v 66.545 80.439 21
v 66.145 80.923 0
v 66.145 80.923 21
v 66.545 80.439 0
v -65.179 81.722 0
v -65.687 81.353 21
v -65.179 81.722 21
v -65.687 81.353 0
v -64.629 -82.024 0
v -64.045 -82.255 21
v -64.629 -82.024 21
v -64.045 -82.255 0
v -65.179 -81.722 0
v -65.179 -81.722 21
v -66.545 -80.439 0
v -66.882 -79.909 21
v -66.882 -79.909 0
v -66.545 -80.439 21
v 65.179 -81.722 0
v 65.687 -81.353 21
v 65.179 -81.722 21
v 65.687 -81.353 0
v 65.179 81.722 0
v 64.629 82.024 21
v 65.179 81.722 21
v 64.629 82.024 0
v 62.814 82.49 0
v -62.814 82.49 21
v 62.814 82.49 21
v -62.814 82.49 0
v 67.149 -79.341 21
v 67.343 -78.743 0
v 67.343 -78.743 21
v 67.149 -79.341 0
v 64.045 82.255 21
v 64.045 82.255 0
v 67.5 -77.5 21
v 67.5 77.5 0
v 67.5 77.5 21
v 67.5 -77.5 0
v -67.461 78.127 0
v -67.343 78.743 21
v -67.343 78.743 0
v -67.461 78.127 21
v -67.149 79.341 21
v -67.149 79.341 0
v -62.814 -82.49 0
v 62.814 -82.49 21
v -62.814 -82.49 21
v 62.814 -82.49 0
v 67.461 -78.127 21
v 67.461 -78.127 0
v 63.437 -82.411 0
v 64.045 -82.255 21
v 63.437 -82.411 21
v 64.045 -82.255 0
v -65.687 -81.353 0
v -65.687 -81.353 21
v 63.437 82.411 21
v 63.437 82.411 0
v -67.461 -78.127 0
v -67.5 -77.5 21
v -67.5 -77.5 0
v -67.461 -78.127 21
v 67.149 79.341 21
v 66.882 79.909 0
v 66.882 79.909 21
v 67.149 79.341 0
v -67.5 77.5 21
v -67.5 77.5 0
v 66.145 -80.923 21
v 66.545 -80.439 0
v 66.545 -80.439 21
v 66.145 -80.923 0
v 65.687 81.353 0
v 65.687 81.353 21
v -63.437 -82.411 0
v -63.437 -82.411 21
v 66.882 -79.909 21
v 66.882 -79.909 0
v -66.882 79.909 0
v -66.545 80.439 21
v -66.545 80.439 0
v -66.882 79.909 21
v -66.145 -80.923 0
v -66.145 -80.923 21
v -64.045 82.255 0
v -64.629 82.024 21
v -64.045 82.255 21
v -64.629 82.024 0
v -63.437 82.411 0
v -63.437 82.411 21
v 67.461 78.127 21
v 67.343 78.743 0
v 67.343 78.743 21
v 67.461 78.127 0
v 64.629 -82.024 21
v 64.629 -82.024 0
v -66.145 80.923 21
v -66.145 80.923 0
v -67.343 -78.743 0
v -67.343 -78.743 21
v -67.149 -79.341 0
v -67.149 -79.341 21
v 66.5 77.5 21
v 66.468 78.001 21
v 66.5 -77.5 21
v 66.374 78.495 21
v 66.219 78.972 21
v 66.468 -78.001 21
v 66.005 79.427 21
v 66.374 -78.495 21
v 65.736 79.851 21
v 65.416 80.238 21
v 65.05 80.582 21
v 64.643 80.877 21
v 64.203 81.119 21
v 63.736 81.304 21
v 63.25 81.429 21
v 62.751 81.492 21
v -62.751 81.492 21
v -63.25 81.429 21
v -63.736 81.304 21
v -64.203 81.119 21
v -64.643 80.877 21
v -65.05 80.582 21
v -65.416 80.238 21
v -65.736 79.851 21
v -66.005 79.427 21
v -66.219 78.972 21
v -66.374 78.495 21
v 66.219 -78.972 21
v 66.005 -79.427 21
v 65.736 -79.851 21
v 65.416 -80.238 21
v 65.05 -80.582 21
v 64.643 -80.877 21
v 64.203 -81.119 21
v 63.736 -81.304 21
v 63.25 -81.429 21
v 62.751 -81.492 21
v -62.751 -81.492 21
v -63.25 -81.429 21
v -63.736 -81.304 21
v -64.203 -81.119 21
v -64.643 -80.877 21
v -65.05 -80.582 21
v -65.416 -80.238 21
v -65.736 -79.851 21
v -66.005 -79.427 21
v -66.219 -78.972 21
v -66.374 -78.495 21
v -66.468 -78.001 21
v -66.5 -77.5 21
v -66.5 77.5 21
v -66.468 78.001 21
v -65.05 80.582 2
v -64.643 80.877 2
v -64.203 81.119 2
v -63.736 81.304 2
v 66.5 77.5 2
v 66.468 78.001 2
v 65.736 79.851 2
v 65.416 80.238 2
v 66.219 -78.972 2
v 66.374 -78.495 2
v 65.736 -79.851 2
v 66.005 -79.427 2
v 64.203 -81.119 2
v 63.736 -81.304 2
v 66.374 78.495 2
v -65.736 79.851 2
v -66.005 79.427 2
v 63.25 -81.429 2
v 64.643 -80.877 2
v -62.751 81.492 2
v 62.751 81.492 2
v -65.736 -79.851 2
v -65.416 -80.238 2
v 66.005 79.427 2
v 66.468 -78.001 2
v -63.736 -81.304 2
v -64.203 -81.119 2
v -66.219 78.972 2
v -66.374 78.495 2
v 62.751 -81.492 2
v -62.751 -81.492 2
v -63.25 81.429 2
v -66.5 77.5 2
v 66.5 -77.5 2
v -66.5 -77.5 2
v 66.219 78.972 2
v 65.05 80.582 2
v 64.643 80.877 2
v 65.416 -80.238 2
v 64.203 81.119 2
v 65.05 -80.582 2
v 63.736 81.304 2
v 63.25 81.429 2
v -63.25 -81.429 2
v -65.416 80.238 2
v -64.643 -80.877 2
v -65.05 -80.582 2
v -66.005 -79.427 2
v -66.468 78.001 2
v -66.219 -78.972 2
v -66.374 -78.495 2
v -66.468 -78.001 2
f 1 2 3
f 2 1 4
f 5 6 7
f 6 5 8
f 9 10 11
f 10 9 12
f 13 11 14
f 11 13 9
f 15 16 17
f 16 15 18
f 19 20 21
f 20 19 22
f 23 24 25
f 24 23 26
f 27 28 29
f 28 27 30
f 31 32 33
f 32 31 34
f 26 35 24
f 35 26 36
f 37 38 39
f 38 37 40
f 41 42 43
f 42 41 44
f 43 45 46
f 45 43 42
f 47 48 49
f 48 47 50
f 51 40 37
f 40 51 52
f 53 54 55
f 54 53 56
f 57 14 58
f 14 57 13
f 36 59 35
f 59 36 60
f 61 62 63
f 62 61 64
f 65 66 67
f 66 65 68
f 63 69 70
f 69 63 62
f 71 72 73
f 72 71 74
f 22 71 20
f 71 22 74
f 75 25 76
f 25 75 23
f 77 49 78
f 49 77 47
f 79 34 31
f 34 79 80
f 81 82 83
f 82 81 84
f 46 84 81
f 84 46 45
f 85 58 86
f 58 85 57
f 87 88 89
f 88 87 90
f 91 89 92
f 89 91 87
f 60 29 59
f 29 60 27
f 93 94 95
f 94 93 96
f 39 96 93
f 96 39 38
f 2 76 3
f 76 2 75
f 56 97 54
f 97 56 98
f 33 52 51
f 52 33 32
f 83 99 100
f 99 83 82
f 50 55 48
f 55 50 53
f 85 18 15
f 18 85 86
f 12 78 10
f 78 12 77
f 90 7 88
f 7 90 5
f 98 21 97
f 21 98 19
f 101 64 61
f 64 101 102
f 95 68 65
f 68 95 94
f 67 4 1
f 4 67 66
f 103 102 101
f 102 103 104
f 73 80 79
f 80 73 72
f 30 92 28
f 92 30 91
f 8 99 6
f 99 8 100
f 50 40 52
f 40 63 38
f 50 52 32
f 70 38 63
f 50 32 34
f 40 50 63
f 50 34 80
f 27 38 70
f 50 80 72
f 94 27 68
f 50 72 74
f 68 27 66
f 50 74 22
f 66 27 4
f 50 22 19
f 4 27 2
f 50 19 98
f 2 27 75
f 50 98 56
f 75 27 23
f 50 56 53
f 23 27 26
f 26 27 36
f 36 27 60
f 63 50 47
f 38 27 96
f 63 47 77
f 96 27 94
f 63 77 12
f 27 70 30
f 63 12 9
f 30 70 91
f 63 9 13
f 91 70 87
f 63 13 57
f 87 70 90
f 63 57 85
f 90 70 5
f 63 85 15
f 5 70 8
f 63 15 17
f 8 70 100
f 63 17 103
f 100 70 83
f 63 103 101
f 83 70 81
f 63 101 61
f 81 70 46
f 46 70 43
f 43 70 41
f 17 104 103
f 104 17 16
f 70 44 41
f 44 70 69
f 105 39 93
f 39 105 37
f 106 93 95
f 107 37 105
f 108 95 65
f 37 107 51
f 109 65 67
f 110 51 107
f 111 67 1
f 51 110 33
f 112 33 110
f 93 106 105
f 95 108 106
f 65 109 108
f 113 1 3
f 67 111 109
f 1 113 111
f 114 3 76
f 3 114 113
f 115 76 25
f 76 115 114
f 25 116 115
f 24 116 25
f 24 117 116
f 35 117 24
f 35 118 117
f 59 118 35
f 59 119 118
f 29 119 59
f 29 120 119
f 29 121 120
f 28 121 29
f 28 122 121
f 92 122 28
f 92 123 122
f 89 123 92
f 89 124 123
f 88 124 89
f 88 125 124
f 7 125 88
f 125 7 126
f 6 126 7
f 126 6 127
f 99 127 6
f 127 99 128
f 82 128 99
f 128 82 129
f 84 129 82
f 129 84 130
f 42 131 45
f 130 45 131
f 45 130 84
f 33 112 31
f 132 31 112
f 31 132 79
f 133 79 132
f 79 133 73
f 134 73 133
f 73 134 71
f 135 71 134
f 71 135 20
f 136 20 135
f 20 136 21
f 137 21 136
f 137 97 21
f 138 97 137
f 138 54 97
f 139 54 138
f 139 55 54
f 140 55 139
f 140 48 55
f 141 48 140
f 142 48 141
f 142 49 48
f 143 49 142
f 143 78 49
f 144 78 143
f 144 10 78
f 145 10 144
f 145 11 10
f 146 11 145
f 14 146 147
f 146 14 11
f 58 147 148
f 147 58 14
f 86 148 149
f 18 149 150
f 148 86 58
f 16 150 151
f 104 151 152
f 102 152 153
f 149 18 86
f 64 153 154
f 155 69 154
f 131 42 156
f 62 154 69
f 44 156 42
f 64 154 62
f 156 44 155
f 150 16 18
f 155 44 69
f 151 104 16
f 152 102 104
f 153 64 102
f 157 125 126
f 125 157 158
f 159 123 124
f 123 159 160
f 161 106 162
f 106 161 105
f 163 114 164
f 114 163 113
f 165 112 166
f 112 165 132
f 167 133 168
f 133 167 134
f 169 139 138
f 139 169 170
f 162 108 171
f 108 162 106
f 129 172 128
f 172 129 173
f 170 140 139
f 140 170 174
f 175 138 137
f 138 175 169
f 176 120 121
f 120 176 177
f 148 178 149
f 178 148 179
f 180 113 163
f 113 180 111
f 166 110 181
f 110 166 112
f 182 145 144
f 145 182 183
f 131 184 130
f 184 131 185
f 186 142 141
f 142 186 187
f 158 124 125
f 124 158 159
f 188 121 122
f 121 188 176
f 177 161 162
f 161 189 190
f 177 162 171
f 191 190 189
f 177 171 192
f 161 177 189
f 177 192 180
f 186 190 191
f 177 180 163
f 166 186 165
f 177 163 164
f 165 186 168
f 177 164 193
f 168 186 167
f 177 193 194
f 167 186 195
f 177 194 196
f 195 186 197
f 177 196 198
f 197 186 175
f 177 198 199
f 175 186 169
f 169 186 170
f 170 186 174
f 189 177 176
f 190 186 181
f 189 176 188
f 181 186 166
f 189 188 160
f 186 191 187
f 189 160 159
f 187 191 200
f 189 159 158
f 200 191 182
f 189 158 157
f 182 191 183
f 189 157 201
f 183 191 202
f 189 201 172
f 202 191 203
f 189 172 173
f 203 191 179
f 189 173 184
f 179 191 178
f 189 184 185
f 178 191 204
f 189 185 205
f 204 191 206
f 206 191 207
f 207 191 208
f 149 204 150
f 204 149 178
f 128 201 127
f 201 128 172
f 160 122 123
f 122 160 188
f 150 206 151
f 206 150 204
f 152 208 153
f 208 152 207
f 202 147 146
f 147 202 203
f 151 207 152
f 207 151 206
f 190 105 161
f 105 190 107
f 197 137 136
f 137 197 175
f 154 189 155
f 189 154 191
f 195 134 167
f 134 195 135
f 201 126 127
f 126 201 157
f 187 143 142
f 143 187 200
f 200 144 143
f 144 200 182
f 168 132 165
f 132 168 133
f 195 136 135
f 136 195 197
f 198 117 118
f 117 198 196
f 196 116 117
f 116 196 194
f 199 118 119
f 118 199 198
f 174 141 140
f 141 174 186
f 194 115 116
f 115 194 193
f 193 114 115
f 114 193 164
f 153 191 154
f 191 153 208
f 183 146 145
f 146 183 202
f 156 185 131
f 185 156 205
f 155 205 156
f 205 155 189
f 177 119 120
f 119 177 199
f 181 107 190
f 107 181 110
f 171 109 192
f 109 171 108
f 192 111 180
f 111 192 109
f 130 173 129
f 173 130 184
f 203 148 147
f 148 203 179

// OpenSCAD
$fn = 50;


difference() {
	union() {
		hull() {
			translate(v = [-62.5000000000, 77.5000000000, 0]) {
				cylinder(h = 21, r = 5);
			}
			translate(v = [62.5000000000, 77.5000000000, 0]) {
				cylinder(h = 21, r = 5);
			}
			translate(v = [-62.5000000000, -77.5000000000, 0]) {
				cylinder(h = 21, r = 5);
			}
			translate(v = [62.5000000000, -77.5000000000, 0]) {
				cylinder(h = 21, r = 5);
			}
		}
	}
	union() {
		translate(v = [0, 0, 2]) {
			hull() {
				translate(v = [-62.5000000000, 77.5000000000, 0]) {
					cylinder(h = 19, r = 4);
				}
				translate(v = [62.5000000000, 77.5000000000, 0]) {
					cylinder(h = 19, r = 4);
				}
				translate(v = [-62.5000000000, -77.5000000000, 0]) {
					cylinder(h = 19, r = 4);
				}
				translate(v = [62.5000000000, -77.5000000000, 0]) {
					cylinder(h = 19, r = 4);
				}
			}
		}
	}
}
